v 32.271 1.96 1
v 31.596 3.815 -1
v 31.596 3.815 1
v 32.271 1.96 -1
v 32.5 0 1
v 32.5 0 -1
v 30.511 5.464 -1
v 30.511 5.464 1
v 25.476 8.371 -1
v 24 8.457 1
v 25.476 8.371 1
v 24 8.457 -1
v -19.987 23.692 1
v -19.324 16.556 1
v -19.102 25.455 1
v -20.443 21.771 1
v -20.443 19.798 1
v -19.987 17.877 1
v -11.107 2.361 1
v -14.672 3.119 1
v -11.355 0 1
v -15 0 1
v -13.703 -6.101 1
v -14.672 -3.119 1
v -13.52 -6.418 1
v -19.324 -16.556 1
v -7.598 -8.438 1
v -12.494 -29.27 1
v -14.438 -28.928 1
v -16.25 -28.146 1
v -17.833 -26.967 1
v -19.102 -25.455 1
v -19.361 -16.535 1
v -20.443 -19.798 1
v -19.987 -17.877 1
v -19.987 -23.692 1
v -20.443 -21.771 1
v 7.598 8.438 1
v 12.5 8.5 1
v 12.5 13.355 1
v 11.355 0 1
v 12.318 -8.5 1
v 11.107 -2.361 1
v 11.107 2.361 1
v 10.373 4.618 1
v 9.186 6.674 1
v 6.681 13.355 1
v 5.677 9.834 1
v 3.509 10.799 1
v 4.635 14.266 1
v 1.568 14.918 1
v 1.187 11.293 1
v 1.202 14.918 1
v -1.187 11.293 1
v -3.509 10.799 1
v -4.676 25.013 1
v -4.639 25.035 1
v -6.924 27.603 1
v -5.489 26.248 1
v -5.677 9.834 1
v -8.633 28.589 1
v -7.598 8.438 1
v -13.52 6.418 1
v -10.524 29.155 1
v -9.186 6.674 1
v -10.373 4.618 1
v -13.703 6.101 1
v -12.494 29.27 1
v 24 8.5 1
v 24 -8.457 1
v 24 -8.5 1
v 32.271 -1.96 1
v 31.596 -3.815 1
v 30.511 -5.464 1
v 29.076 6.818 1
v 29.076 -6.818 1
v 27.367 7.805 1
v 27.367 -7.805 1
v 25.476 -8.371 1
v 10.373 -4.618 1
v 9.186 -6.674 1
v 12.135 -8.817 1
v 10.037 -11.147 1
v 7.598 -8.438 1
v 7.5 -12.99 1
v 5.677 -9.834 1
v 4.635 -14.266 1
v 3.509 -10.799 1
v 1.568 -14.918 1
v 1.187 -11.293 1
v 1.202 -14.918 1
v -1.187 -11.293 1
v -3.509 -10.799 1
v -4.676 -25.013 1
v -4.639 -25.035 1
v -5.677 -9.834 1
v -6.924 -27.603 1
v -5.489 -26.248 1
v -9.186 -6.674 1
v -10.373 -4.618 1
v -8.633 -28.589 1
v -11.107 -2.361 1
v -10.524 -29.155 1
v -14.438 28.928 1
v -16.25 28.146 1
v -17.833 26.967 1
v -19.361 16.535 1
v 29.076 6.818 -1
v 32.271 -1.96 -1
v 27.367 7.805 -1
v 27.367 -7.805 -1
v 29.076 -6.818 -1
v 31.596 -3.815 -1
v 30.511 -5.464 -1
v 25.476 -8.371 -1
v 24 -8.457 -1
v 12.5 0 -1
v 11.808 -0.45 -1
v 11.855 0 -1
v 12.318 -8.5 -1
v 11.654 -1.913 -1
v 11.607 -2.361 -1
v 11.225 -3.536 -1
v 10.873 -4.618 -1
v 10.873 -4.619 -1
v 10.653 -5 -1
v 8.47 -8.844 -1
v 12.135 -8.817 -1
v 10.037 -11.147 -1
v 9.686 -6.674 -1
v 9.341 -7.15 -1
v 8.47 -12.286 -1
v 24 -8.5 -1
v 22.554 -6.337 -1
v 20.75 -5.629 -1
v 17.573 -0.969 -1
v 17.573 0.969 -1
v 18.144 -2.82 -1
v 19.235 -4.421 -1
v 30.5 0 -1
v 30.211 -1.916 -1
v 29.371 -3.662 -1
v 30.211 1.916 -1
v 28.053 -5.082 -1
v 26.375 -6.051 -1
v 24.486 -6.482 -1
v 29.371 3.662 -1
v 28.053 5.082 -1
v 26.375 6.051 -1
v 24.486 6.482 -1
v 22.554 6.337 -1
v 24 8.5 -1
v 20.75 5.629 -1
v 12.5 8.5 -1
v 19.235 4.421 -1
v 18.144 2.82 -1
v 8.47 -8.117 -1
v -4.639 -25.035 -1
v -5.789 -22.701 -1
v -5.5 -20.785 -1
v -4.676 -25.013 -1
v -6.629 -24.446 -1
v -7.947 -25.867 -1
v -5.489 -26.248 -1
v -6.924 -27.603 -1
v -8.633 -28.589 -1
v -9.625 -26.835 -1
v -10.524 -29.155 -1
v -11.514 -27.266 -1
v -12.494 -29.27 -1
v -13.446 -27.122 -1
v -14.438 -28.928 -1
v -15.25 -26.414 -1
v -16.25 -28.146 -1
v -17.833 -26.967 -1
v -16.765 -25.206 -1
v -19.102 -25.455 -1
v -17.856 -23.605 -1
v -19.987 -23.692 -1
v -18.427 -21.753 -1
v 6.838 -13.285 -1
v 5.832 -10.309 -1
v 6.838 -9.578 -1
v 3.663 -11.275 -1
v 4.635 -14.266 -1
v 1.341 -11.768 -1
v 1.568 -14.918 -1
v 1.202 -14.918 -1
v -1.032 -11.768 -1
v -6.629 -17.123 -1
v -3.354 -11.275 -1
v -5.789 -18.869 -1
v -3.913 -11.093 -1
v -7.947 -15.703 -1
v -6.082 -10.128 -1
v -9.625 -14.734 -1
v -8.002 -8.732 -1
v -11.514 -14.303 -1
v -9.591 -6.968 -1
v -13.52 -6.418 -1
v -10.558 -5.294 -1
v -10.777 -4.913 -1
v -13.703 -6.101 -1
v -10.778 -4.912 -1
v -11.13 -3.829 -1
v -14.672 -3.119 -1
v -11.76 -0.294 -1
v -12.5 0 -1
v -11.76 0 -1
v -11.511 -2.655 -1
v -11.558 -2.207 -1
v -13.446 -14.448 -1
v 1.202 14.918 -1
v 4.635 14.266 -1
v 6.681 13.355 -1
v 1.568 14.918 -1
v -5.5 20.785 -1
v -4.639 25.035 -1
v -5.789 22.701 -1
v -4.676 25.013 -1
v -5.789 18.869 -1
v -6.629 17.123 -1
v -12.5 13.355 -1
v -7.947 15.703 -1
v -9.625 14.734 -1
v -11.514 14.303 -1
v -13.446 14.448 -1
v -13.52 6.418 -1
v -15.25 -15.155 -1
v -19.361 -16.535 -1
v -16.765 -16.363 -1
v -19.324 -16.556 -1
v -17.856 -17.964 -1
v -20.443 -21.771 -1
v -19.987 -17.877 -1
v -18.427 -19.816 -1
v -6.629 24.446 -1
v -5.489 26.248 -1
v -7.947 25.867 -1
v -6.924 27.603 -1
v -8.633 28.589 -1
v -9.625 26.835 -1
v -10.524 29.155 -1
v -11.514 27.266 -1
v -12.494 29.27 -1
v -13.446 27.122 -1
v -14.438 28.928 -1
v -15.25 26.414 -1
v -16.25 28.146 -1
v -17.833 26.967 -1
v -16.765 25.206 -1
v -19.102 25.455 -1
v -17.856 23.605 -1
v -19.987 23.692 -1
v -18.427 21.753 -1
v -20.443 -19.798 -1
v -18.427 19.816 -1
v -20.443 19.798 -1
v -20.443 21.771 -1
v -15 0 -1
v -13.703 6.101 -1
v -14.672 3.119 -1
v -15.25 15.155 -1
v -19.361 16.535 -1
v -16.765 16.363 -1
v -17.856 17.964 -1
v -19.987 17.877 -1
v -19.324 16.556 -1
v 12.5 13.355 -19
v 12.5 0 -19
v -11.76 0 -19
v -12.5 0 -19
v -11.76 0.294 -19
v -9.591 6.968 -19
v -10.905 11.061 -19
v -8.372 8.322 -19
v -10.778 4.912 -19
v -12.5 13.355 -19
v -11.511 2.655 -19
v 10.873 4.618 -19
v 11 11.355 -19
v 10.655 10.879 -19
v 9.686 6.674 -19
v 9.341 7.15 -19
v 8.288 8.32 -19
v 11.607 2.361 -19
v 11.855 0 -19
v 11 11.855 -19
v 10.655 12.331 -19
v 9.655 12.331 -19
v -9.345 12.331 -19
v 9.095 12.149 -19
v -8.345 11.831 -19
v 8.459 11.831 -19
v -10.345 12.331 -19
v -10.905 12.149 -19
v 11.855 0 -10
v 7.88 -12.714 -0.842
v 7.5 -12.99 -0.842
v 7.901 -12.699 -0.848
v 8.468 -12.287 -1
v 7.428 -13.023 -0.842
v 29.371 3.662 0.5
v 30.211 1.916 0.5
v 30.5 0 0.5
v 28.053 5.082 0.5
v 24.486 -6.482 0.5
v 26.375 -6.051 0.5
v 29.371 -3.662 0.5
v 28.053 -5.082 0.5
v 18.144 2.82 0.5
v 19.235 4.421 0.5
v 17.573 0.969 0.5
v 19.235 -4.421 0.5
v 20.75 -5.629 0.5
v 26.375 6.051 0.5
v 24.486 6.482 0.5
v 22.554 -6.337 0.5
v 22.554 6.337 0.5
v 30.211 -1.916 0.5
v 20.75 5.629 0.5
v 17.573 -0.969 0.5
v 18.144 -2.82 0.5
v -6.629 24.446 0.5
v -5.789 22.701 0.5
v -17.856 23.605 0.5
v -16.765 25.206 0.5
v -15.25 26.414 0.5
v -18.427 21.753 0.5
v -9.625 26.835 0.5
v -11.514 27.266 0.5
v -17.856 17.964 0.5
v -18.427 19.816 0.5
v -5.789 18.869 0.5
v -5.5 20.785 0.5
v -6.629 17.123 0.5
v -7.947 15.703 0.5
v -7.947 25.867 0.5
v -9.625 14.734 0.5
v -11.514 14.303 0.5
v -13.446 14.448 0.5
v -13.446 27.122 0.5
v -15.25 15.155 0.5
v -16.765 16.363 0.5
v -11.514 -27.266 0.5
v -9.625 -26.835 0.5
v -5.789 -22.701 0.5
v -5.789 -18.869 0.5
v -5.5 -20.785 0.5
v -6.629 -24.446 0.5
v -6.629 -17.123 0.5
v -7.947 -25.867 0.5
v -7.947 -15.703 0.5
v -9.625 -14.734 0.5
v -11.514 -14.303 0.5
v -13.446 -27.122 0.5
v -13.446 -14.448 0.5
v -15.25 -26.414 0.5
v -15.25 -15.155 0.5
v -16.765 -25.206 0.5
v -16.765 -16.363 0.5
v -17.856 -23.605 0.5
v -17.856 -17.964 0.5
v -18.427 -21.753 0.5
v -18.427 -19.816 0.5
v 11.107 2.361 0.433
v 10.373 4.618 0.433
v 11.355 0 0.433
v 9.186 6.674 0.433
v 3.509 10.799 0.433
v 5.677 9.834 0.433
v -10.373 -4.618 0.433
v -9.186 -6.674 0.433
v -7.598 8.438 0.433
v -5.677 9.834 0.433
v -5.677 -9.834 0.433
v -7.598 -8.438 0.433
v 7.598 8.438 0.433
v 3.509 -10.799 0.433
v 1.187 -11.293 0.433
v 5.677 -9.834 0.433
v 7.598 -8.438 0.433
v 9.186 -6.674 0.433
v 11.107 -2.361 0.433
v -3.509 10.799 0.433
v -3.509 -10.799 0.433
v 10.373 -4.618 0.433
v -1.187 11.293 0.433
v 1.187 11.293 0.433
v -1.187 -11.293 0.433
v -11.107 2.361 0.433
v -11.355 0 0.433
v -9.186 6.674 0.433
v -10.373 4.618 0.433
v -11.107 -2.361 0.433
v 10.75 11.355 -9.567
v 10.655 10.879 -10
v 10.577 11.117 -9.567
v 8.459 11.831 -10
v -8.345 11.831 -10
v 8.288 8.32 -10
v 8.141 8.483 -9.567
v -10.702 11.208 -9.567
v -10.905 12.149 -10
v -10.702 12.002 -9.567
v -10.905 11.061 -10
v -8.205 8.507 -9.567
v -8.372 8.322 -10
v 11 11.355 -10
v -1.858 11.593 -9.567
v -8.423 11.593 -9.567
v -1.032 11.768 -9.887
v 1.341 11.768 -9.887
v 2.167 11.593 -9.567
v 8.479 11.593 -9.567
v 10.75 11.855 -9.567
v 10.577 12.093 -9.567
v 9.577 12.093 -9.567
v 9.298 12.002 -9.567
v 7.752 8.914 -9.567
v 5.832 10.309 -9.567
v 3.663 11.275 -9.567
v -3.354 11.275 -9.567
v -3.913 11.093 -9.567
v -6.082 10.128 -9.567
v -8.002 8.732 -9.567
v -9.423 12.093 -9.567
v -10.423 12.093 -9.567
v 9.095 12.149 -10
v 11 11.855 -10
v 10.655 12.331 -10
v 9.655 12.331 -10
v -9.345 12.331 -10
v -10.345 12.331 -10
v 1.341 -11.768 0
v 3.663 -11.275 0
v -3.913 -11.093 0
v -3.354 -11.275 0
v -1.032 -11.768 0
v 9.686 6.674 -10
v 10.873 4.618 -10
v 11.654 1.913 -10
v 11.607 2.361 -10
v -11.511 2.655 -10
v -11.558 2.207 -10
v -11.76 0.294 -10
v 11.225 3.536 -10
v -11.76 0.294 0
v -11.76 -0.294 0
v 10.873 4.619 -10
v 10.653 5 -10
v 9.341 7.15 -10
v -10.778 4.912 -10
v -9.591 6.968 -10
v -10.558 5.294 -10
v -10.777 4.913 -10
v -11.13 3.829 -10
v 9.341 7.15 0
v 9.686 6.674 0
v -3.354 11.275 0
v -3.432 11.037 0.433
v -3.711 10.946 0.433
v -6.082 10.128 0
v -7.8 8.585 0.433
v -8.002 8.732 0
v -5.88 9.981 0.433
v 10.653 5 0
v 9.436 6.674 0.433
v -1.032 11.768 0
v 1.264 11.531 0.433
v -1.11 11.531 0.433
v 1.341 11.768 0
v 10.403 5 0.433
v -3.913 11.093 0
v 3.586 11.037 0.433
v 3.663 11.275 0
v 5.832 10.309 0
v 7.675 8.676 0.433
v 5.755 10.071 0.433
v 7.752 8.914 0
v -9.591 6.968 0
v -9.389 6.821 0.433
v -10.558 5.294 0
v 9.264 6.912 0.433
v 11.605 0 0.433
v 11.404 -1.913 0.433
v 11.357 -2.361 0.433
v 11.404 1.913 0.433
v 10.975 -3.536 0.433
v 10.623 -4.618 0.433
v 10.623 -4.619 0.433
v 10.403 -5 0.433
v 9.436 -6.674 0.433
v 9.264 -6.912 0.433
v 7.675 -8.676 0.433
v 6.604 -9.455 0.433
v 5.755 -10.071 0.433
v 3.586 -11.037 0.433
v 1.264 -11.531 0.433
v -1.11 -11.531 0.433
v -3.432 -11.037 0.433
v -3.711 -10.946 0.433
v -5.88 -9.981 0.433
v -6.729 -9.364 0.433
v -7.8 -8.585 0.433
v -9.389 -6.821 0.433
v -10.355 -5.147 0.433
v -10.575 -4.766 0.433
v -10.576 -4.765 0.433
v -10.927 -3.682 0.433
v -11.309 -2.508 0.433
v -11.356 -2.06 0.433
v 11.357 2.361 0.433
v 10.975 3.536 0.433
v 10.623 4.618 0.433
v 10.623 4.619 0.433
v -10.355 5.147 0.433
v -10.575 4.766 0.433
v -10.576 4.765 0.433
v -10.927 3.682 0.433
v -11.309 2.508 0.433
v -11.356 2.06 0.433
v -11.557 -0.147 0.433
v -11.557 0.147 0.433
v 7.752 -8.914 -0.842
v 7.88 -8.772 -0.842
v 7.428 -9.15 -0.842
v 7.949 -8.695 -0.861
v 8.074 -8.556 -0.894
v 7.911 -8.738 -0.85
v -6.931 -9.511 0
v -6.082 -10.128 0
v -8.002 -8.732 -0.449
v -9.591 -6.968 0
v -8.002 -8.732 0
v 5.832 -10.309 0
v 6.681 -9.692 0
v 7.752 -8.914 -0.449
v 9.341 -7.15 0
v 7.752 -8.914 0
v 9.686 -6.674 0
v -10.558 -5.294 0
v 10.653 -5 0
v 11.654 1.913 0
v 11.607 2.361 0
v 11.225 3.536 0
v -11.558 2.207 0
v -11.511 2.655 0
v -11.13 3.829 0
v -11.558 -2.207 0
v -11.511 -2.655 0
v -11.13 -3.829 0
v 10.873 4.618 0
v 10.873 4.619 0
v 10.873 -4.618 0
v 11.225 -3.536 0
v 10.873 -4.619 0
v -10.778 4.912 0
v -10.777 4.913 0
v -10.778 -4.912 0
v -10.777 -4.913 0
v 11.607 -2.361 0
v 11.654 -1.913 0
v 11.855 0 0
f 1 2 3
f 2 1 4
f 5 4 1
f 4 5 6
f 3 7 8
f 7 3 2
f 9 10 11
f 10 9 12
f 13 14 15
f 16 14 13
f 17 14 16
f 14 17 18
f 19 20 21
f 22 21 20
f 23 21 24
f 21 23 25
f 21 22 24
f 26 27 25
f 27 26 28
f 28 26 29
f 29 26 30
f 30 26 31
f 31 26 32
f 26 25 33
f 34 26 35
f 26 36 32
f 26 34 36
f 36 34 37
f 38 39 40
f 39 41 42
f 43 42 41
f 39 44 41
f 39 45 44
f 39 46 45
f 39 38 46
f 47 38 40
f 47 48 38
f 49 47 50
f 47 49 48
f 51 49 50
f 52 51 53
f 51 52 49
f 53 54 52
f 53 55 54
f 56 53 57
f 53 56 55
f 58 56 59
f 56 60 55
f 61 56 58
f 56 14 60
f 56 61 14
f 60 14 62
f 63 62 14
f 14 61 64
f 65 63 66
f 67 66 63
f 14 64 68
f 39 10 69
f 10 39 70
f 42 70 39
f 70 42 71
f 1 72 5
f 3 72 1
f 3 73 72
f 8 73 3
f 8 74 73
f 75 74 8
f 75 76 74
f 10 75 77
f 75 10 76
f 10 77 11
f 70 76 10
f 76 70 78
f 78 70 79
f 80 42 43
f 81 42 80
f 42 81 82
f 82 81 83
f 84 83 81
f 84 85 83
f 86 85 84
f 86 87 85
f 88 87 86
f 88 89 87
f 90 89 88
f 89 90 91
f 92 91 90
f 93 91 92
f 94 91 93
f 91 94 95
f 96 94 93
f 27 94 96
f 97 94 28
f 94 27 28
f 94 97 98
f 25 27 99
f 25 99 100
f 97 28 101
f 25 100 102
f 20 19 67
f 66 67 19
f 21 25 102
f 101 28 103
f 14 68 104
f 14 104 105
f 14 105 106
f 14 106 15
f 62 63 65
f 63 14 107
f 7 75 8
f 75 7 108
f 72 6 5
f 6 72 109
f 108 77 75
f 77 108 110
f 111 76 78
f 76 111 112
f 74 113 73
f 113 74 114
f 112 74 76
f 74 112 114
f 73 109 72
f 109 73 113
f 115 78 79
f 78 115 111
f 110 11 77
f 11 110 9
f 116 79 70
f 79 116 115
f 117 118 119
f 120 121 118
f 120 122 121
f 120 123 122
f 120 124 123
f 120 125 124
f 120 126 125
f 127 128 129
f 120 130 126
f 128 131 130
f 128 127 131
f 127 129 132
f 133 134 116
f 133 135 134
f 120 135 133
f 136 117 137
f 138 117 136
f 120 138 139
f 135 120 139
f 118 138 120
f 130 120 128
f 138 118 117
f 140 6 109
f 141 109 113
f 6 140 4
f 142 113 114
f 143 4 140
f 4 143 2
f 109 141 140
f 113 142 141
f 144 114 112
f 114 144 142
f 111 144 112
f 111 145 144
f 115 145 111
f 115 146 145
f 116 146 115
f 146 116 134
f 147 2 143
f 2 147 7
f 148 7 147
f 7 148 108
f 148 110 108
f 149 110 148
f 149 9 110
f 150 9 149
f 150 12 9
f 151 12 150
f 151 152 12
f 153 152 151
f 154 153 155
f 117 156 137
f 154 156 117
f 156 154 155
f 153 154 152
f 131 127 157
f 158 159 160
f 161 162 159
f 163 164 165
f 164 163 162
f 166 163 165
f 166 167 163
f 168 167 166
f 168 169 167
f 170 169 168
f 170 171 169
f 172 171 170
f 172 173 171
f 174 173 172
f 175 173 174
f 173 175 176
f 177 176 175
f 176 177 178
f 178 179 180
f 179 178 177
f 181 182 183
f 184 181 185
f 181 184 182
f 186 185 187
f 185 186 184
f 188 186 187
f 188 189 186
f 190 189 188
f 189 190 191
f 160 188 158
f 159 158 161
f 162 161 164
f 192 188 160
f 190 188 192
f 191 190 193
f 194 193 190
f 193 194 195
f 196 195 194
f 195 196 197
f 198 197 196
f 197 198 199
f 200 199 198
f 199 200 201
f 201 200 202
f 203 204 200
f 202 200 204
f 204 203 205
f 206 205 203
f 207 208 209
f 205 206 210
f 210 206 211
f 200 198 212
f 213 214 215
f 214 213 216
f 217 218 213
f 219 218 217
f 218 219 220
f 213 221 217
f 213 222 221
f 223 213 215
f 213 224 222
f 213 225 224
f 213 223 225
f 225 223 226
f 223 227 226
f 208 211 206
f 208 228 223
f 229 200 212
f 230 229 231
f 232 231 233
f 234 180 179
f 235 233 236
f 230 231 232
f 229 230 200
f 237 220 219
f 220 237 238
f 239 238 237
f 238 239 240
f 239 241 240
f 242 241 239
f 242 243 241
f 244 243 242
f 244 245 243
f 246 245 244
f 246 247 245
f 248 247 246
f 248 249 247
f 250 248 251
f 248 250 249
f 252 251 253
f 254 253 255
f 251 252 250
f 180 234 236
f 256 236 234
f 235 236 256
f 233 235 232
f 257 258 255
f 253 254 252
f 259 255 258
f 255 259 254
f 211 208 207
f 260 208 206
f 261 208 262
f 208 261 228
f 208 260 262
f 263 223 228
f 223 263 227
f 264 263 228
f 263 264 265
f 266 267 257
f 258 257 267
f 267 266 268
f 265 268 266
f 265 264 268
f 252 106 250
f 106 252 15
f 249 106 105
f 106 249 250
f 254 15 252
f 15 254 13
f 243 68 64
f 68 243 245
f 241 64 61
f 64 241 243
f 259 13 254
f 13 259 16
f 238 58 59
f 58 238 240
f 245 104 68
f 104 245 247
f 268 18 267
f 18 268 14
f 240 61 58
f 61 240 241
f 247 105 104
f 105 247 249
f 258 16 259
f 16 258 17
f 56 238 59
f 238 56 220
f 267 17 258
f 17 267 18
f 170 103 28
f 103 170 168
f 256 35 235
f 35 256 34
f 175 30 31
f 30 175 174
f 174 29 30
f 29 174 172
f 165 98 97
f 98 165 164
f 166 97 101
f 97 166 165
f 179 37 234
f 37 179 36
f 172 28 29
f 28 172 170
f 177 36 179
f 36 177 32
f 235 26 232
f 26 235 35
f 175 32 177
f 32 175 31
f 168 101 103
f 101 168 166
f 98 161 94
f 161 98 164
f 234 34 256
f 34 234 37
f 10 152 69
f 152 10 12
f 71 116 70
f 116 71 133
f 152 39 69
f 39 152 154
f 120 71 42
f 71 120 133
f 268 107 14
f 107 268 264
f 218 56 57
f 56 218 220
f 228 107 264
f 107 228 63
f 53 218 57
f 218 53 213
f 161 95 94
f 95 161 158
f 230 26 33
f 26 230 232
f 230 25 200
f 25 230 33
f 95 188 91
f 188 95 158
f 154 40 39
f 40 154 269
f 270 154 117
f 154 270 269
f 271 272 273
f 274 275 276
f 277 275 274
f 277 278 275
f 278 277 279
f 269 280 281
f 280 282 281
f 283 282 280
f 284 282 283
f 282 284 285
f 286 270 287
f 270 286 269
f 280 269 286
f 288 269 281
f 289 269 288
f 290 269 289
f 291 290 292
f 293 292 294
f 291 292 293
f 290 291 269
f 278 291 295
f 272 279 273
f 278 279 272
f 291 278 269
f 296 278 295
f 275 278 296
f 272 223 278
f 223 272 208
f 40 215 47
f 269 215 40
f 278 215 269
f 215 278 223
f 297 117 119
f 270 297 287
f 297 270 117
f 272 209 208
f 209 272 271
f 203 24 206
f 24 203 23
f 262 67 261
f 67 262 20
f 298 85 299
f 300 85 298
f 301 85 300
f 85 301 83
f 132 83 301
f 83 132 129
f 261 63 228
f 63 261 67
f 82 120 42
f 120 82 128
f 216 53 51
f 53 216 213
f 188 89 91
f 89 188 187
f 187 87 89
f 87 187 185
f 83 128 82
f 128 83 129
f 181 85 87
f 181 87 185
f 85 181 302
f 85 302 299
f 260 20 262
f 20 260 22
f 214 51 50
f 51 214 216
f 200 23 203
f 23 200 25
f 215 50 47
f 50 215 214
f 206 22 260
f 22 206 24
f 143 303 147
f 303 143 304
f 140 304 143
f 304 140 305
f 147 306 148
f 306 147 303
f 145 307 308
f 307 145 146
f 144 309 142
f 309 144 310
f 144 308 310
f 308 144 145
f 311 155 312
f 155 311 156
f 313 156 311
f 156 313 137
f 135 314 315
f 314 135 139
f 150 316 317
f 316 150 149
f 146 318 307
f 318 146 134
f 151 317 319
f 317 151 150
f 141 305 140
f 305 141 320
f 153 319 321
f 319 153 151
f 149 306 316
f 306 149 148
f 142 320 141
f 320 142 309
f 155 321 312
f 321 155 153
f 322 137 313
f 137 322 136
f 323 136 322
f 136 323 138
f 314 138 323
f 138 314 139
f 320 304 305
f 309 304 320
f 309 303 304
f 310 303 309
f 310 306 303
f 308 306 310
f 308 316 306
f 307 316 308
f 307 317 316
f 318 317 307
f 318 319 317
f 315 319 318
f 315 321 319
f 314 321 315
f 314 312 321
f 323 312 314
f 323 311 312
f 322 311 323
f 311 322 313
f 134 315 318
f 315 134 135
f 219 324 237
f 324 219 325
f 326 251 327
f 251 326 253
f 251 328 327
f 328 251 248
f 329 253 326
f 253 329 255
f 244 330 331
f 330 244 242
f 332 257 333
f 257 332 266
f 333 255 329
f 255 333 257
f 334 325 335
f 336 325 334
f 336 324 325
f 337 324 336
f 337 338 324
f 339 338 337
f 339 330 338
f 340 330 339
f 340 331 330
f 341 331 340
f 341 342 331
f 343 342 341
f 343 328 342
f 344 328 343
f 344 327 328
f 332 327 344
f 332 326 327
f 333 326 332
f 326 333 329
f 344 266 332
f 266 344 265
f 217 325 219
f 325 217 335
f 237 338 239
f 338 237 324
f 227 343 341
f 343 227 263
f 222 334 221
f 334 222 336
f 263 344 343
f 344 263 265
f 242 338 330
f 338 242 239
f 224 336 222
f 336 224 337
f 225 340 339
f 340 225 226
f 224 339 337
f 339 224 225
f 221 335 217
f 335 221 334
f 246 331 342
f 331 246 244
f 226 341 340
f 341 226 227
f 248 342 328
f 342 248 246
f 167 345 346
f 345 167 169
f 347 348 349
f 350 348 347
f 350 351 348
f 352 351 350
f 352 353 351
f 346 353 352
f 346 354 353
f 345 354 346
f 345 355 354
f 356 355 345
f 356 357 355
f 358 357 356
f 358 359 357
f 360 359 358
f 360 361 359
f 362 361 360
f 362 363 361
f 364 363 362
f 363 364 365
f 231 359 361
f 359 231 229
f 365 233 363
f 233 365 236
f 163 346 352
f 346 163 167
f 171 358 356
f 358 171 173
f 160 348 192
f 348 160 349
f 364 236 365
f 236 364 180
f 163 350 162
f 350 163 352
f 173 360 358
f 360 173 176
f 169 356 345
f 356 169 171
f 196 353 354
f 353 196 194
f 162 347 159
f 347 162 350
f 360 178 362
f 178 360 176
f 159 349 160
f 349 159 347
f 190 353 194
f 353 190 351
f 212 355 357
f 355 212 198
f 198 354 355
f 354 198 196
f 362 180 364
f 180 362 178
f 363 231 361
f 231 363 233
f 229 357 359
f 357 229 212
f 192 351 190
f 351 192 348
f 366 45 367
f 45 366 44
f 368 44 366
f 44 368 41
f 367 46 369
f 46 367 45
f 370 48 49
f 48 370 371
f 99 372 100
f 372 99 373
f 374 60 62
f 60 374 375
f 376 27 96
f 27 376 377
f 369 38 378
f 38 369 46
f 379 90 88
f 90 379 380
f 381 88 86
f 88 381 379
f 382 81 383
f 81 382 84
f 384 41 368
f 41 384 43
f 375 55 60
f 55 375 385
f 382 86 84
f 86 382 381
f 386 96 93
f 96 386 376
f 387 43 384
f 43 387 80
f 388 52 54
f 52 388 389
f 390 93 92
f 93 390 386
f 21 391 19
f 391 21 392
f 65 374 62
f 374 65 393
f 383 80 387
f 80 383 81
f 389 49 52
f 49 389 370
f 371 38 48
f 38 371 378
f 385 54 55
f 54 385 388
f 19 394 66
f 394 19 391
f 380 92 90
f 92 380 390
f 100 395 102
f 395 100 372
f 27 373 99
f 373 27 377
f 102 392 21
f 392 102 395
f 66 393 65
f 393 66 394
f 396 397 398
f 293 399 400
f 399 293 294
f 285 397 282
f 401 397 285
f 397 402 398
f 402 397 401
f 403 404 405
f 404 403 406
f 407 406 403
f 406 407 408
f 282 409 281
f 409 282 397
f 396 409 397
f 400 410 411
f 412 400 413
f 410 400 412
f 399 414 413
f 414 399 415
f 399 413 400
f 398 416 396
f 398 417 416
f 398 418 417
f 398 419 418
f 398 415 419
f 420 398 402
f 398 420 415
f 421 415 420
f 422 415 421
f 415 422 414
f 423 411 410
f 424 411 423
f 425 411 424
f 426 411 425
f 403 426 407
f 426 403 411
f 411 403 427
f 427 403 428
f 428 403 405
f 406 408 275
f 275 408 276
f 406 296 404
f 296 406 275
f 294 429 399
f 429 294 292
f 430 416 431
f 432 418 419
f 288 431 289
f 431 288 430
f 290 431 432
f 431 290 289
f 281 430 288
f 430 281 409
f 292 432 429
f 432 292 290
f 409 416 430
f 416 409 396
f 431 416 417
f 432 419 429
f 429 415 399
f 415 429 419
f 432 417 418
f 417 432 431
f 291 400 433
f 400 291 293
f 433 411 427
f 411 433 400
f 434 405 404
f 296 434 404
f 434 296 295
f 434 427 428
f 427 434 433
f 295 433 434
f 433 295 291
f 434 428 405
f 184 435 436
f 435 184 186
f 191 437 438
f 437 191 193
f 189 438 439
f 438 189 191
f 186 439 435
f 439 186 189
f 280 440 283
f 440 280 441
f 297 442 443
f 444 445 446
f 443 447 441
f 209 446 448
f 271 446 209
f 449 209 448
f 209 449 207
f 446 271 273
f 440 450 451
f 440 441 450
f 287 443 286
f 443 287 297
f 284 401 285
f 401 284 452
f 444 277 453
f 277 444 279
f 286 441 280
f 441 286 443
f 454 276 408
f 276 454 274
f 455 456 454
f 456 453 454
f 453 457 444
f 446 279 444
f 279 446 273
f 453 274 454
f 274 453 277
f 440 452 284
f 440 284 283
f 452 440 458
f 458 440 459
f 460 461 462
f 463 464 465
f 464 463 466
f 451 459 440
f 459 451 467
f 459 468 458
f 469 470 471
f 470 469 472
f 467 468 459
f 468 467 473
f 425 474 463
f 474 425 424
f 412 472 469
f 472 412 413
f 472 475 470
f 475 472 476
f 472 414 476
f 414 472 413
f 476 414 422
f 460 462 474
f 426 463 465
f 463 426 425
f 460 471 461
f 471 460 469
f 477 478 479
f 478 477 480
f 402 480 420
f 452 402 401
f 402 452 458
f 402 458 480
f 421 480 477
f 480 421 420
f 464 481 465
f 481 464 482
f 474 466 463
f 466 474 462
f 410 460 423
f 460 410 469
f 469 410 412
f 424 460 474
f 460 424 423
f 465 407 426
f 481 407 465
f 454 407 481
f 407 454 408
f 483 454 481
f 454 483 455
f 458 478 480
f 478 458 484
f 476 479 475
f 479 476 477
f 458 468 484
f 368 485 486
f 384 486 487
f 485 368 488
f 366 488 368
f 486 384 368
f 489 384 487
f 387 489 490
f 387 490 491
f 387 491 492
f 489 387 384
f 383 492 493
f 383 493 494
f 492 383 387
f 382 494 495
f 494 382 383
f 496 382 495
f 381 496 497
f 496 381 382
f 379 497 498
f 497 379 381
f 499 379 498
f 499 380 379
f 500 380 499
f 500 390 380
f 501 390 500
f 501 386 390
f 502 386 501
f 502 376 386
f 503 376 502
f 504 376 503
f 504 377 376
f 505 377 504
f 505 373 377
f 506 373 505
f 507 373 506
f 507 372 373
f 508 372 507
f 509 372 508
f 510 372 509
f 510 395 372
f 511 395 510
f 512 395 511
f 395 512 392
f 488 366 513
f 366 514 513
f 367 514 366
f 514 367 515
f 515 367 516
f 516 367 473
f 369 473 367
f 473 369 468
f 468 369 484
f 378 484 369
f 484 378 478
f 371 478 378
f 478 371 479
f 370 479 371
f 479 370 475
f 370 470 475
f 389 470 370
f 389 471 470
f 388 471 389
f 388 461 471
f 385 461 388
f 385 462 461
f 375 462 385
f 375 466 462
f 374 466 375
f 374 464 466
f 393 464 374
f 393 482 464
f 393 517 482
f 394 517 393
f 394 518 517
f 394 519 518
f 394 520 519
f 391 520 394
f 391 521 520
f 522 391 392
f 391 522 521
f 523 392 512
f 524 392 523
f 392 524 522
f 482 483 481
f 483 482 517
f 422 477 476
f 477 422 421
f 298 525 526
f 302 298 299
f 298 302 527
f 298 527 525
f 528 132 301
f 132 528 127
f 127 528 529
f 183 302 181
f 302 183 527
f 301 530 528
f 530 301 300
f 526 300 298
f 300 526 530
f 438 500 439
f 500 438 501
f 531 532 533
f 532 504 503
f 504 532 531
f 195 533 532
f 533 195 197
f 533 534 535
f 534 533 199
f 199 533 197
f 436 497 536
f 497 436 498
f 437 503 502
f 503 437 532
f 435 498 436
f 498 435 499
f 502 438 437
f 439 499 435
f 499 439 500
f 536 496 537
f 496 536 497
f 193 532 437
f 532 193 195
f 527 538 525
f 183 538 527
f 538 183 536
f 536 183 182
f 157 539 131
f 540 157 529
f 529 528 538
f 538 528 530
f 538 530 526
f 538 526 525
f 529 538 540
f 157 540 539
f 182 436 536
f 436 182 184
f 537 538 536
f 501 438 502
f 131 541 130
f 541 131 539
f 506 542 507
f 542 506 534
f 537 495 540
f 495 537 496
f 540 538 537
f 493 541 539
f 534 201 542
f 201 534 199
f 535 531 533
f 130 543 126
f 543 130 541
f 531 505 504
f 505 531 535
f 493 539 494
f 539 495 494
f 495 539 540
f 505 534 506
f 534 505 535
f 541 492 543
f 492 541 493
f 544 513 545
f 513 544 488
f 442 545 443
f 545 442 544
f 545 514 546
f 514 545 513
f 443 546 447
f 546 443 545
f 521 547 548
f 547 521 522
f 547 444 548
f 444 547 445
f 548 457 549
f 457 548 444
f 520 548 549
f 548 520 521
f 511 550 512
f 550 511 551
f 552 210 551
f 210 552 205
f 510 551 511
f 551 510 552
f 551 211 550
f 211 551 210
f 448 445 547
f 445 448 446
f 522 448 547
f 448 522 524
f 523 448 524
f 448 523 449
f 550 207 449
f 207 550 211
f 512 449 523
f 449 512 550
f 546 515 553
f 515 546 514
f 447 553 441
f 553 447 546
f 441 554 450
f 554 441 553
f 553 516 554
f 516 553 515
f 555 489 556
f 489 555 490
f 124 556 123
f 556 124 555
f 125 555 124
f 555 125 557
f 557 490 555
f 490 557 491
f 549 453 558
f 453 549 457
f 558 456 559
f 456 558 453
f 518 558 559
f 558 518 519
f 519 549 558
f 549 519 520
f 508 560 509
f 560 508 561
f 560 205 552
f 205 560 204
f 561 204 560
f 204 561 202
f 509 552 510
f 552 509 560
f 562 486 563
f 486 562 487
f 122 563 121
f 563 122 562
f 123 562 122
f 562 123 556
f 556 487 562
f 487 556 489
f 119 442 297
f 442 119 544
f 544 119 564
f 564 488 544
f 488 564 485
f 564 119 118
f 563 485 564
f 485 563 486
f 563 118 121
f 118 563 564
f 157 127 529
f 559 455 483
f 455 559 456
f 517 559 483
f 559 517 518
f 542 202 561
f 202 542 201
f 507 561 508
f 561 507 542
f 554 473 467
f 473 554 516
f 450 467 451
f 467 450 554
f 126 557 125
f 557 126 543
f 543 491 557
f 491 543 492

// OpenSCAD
// file: lib/pump_4547.scad
function pump_4547_pump_diameter() = 22.71;
function pump_4547_foot_width() = 21;

// Submersible 3V DC Water Pump - 1 Meter Vertical Type, Adafruit 4547
// https://www.adafruit.com/product/4547
// JT-DC3W-3
// The component body has three main parts:
// - pump: a 10mm long housing with a fan attached to the motor shaft. The pump has a port meant to attach a hose
// - motor: a 27mm long housing containing a DC motor. The motor has a foot meant to slide into a slot for mounting
// - end: a short section covering the electrical connection on the back of the motor
module pump_4547() {
    pump_length=10;
    intake_diameter=10;
    lip_height=1;
    lip_diameter=13;
    alignment_offset=9;
    alignment_diameter=2;
    alignment_height=2;
    port_diameter=7.45;
    port_inner_diameter=port_diameter-2;
    port_height=9.75;
    motor_diameter=22.71;
    motor_length=27;
    end_length=42.6-motor_length-pump_length;
    end_diameter=23.9;

    translate([0,0,-pump_length]) union() {
        // pump
        difference() {
            union() {
                // pump body
                cylinder(h=pump_length, d=pump_4547_pump_diameter());
                
                // pump port
                translate([pump_4547_pump_diameter()/2-port_diameter/2,0,pump_length/2]) rotate([90,0,0]) difference() {
                    cylinder(h=port_height+pump_4547_pump_diameter()/2, d=port_diameter);
                    cylinder(h=port_height+pump_4547_pump_diameter()/2, d=port_inner_diameter);
                }
                
                // pump intake lip
                cylinder(h=pump_length+lip_height, d=lip_diameter);
                
                // alignment points
                for(t=[0:360/3:360]) rotate([0,0,t]) translate([0,-alignment_offset,0]) cylinder(h=pump_length+alignment_height, d=alignment_diameter);
            }
            
            // pump intake
            cylinder(h=pump_length+lip_height, d=intake_diameter);
        }
        
        // motor
        translate([0,0,-motor_length]) {
            cylinder(h=motor_length, d=motor_diameter);
            linear_extrude(motor_length) polygon([
            [-pump_4547_foot_width()/2+2,motor_diameter/2],
            [-pump_4547_foot_width()/2+1,motor_diameter/2+0.5],
            [-pump_4547_foot_width()/2,motor_diameter/2+0.5],
            [-pump_4547_foot_width()/2,motor_diameter/2],
            [0,0],
            [pump_4547_foot_width()/2,motor_diameter/2],
            [pump_4547_foot_width()/2,motor_diameter/2+0.5],
            [pump_4547_foot_width()/2-1,motor_diameter/2+0.5],        [pump_4547_foot_width()/2-2,motor_diameter/2]
            ]);
        }

        // end
        translate([0,0,-end_length-motor_length]) {
            cylinder(h=end_length, d=end_diameter);
        }
    }
}

color("beige") pump_4547();
// main file
use <lib/pump_4547.scad>

clearance=1;
body_thickness=2;
body_length=0; // matching alignment points
foot_width=pump_4547_foot_width()+2*body_thickness;
foot_height=pump_4547_pump_diameter()/2+body_thickness;
foot_length=body_length+20;
foot_size=[foot_width, foot_height, foot_length];

port_diameter=7.45;
port_inner_diameter=port_diameter-body_thickness;
port_height=9.75;

// % translate([0,0,-10]) pump_4547();


color("green") {
    difference() {
        translate([0,0,1]) union() {            
            // magnetic base
            difference() {
              union() {
                              // pump foot
            translate(-foot_size/2+[0,foot_height/2,-foot_length/2+body_length]) cube(size=foot_size);

                // structural ring
                translate([0,0,-2]) cylinder(h=2, d=30);

                // arm
                for(t=[0:360/3:360]) rotate([0,0,t]) translate([24,0,-2]) cylinder(h=2,d=13+4);
                for(t=[0:360/3:360]) rotate([0,0,t]) translate([0,-17/2,-2]) cube([24,17,2]);
              }
                

              // magnet
              for(t=[0:360/3:360]) rotate([0,0,t]) translate([24,0,-4.5]) cylinder(h=4,d=13);
                  
              // pump body
              translate([0,0,-99]) cylinder(h=100, d=pump_4547_pump_diameter());
            }
        }
        
        // subtract the pump body
        minkowski() {
            pump_4547();
            sphere(d=clearance);
        }
    }
}
